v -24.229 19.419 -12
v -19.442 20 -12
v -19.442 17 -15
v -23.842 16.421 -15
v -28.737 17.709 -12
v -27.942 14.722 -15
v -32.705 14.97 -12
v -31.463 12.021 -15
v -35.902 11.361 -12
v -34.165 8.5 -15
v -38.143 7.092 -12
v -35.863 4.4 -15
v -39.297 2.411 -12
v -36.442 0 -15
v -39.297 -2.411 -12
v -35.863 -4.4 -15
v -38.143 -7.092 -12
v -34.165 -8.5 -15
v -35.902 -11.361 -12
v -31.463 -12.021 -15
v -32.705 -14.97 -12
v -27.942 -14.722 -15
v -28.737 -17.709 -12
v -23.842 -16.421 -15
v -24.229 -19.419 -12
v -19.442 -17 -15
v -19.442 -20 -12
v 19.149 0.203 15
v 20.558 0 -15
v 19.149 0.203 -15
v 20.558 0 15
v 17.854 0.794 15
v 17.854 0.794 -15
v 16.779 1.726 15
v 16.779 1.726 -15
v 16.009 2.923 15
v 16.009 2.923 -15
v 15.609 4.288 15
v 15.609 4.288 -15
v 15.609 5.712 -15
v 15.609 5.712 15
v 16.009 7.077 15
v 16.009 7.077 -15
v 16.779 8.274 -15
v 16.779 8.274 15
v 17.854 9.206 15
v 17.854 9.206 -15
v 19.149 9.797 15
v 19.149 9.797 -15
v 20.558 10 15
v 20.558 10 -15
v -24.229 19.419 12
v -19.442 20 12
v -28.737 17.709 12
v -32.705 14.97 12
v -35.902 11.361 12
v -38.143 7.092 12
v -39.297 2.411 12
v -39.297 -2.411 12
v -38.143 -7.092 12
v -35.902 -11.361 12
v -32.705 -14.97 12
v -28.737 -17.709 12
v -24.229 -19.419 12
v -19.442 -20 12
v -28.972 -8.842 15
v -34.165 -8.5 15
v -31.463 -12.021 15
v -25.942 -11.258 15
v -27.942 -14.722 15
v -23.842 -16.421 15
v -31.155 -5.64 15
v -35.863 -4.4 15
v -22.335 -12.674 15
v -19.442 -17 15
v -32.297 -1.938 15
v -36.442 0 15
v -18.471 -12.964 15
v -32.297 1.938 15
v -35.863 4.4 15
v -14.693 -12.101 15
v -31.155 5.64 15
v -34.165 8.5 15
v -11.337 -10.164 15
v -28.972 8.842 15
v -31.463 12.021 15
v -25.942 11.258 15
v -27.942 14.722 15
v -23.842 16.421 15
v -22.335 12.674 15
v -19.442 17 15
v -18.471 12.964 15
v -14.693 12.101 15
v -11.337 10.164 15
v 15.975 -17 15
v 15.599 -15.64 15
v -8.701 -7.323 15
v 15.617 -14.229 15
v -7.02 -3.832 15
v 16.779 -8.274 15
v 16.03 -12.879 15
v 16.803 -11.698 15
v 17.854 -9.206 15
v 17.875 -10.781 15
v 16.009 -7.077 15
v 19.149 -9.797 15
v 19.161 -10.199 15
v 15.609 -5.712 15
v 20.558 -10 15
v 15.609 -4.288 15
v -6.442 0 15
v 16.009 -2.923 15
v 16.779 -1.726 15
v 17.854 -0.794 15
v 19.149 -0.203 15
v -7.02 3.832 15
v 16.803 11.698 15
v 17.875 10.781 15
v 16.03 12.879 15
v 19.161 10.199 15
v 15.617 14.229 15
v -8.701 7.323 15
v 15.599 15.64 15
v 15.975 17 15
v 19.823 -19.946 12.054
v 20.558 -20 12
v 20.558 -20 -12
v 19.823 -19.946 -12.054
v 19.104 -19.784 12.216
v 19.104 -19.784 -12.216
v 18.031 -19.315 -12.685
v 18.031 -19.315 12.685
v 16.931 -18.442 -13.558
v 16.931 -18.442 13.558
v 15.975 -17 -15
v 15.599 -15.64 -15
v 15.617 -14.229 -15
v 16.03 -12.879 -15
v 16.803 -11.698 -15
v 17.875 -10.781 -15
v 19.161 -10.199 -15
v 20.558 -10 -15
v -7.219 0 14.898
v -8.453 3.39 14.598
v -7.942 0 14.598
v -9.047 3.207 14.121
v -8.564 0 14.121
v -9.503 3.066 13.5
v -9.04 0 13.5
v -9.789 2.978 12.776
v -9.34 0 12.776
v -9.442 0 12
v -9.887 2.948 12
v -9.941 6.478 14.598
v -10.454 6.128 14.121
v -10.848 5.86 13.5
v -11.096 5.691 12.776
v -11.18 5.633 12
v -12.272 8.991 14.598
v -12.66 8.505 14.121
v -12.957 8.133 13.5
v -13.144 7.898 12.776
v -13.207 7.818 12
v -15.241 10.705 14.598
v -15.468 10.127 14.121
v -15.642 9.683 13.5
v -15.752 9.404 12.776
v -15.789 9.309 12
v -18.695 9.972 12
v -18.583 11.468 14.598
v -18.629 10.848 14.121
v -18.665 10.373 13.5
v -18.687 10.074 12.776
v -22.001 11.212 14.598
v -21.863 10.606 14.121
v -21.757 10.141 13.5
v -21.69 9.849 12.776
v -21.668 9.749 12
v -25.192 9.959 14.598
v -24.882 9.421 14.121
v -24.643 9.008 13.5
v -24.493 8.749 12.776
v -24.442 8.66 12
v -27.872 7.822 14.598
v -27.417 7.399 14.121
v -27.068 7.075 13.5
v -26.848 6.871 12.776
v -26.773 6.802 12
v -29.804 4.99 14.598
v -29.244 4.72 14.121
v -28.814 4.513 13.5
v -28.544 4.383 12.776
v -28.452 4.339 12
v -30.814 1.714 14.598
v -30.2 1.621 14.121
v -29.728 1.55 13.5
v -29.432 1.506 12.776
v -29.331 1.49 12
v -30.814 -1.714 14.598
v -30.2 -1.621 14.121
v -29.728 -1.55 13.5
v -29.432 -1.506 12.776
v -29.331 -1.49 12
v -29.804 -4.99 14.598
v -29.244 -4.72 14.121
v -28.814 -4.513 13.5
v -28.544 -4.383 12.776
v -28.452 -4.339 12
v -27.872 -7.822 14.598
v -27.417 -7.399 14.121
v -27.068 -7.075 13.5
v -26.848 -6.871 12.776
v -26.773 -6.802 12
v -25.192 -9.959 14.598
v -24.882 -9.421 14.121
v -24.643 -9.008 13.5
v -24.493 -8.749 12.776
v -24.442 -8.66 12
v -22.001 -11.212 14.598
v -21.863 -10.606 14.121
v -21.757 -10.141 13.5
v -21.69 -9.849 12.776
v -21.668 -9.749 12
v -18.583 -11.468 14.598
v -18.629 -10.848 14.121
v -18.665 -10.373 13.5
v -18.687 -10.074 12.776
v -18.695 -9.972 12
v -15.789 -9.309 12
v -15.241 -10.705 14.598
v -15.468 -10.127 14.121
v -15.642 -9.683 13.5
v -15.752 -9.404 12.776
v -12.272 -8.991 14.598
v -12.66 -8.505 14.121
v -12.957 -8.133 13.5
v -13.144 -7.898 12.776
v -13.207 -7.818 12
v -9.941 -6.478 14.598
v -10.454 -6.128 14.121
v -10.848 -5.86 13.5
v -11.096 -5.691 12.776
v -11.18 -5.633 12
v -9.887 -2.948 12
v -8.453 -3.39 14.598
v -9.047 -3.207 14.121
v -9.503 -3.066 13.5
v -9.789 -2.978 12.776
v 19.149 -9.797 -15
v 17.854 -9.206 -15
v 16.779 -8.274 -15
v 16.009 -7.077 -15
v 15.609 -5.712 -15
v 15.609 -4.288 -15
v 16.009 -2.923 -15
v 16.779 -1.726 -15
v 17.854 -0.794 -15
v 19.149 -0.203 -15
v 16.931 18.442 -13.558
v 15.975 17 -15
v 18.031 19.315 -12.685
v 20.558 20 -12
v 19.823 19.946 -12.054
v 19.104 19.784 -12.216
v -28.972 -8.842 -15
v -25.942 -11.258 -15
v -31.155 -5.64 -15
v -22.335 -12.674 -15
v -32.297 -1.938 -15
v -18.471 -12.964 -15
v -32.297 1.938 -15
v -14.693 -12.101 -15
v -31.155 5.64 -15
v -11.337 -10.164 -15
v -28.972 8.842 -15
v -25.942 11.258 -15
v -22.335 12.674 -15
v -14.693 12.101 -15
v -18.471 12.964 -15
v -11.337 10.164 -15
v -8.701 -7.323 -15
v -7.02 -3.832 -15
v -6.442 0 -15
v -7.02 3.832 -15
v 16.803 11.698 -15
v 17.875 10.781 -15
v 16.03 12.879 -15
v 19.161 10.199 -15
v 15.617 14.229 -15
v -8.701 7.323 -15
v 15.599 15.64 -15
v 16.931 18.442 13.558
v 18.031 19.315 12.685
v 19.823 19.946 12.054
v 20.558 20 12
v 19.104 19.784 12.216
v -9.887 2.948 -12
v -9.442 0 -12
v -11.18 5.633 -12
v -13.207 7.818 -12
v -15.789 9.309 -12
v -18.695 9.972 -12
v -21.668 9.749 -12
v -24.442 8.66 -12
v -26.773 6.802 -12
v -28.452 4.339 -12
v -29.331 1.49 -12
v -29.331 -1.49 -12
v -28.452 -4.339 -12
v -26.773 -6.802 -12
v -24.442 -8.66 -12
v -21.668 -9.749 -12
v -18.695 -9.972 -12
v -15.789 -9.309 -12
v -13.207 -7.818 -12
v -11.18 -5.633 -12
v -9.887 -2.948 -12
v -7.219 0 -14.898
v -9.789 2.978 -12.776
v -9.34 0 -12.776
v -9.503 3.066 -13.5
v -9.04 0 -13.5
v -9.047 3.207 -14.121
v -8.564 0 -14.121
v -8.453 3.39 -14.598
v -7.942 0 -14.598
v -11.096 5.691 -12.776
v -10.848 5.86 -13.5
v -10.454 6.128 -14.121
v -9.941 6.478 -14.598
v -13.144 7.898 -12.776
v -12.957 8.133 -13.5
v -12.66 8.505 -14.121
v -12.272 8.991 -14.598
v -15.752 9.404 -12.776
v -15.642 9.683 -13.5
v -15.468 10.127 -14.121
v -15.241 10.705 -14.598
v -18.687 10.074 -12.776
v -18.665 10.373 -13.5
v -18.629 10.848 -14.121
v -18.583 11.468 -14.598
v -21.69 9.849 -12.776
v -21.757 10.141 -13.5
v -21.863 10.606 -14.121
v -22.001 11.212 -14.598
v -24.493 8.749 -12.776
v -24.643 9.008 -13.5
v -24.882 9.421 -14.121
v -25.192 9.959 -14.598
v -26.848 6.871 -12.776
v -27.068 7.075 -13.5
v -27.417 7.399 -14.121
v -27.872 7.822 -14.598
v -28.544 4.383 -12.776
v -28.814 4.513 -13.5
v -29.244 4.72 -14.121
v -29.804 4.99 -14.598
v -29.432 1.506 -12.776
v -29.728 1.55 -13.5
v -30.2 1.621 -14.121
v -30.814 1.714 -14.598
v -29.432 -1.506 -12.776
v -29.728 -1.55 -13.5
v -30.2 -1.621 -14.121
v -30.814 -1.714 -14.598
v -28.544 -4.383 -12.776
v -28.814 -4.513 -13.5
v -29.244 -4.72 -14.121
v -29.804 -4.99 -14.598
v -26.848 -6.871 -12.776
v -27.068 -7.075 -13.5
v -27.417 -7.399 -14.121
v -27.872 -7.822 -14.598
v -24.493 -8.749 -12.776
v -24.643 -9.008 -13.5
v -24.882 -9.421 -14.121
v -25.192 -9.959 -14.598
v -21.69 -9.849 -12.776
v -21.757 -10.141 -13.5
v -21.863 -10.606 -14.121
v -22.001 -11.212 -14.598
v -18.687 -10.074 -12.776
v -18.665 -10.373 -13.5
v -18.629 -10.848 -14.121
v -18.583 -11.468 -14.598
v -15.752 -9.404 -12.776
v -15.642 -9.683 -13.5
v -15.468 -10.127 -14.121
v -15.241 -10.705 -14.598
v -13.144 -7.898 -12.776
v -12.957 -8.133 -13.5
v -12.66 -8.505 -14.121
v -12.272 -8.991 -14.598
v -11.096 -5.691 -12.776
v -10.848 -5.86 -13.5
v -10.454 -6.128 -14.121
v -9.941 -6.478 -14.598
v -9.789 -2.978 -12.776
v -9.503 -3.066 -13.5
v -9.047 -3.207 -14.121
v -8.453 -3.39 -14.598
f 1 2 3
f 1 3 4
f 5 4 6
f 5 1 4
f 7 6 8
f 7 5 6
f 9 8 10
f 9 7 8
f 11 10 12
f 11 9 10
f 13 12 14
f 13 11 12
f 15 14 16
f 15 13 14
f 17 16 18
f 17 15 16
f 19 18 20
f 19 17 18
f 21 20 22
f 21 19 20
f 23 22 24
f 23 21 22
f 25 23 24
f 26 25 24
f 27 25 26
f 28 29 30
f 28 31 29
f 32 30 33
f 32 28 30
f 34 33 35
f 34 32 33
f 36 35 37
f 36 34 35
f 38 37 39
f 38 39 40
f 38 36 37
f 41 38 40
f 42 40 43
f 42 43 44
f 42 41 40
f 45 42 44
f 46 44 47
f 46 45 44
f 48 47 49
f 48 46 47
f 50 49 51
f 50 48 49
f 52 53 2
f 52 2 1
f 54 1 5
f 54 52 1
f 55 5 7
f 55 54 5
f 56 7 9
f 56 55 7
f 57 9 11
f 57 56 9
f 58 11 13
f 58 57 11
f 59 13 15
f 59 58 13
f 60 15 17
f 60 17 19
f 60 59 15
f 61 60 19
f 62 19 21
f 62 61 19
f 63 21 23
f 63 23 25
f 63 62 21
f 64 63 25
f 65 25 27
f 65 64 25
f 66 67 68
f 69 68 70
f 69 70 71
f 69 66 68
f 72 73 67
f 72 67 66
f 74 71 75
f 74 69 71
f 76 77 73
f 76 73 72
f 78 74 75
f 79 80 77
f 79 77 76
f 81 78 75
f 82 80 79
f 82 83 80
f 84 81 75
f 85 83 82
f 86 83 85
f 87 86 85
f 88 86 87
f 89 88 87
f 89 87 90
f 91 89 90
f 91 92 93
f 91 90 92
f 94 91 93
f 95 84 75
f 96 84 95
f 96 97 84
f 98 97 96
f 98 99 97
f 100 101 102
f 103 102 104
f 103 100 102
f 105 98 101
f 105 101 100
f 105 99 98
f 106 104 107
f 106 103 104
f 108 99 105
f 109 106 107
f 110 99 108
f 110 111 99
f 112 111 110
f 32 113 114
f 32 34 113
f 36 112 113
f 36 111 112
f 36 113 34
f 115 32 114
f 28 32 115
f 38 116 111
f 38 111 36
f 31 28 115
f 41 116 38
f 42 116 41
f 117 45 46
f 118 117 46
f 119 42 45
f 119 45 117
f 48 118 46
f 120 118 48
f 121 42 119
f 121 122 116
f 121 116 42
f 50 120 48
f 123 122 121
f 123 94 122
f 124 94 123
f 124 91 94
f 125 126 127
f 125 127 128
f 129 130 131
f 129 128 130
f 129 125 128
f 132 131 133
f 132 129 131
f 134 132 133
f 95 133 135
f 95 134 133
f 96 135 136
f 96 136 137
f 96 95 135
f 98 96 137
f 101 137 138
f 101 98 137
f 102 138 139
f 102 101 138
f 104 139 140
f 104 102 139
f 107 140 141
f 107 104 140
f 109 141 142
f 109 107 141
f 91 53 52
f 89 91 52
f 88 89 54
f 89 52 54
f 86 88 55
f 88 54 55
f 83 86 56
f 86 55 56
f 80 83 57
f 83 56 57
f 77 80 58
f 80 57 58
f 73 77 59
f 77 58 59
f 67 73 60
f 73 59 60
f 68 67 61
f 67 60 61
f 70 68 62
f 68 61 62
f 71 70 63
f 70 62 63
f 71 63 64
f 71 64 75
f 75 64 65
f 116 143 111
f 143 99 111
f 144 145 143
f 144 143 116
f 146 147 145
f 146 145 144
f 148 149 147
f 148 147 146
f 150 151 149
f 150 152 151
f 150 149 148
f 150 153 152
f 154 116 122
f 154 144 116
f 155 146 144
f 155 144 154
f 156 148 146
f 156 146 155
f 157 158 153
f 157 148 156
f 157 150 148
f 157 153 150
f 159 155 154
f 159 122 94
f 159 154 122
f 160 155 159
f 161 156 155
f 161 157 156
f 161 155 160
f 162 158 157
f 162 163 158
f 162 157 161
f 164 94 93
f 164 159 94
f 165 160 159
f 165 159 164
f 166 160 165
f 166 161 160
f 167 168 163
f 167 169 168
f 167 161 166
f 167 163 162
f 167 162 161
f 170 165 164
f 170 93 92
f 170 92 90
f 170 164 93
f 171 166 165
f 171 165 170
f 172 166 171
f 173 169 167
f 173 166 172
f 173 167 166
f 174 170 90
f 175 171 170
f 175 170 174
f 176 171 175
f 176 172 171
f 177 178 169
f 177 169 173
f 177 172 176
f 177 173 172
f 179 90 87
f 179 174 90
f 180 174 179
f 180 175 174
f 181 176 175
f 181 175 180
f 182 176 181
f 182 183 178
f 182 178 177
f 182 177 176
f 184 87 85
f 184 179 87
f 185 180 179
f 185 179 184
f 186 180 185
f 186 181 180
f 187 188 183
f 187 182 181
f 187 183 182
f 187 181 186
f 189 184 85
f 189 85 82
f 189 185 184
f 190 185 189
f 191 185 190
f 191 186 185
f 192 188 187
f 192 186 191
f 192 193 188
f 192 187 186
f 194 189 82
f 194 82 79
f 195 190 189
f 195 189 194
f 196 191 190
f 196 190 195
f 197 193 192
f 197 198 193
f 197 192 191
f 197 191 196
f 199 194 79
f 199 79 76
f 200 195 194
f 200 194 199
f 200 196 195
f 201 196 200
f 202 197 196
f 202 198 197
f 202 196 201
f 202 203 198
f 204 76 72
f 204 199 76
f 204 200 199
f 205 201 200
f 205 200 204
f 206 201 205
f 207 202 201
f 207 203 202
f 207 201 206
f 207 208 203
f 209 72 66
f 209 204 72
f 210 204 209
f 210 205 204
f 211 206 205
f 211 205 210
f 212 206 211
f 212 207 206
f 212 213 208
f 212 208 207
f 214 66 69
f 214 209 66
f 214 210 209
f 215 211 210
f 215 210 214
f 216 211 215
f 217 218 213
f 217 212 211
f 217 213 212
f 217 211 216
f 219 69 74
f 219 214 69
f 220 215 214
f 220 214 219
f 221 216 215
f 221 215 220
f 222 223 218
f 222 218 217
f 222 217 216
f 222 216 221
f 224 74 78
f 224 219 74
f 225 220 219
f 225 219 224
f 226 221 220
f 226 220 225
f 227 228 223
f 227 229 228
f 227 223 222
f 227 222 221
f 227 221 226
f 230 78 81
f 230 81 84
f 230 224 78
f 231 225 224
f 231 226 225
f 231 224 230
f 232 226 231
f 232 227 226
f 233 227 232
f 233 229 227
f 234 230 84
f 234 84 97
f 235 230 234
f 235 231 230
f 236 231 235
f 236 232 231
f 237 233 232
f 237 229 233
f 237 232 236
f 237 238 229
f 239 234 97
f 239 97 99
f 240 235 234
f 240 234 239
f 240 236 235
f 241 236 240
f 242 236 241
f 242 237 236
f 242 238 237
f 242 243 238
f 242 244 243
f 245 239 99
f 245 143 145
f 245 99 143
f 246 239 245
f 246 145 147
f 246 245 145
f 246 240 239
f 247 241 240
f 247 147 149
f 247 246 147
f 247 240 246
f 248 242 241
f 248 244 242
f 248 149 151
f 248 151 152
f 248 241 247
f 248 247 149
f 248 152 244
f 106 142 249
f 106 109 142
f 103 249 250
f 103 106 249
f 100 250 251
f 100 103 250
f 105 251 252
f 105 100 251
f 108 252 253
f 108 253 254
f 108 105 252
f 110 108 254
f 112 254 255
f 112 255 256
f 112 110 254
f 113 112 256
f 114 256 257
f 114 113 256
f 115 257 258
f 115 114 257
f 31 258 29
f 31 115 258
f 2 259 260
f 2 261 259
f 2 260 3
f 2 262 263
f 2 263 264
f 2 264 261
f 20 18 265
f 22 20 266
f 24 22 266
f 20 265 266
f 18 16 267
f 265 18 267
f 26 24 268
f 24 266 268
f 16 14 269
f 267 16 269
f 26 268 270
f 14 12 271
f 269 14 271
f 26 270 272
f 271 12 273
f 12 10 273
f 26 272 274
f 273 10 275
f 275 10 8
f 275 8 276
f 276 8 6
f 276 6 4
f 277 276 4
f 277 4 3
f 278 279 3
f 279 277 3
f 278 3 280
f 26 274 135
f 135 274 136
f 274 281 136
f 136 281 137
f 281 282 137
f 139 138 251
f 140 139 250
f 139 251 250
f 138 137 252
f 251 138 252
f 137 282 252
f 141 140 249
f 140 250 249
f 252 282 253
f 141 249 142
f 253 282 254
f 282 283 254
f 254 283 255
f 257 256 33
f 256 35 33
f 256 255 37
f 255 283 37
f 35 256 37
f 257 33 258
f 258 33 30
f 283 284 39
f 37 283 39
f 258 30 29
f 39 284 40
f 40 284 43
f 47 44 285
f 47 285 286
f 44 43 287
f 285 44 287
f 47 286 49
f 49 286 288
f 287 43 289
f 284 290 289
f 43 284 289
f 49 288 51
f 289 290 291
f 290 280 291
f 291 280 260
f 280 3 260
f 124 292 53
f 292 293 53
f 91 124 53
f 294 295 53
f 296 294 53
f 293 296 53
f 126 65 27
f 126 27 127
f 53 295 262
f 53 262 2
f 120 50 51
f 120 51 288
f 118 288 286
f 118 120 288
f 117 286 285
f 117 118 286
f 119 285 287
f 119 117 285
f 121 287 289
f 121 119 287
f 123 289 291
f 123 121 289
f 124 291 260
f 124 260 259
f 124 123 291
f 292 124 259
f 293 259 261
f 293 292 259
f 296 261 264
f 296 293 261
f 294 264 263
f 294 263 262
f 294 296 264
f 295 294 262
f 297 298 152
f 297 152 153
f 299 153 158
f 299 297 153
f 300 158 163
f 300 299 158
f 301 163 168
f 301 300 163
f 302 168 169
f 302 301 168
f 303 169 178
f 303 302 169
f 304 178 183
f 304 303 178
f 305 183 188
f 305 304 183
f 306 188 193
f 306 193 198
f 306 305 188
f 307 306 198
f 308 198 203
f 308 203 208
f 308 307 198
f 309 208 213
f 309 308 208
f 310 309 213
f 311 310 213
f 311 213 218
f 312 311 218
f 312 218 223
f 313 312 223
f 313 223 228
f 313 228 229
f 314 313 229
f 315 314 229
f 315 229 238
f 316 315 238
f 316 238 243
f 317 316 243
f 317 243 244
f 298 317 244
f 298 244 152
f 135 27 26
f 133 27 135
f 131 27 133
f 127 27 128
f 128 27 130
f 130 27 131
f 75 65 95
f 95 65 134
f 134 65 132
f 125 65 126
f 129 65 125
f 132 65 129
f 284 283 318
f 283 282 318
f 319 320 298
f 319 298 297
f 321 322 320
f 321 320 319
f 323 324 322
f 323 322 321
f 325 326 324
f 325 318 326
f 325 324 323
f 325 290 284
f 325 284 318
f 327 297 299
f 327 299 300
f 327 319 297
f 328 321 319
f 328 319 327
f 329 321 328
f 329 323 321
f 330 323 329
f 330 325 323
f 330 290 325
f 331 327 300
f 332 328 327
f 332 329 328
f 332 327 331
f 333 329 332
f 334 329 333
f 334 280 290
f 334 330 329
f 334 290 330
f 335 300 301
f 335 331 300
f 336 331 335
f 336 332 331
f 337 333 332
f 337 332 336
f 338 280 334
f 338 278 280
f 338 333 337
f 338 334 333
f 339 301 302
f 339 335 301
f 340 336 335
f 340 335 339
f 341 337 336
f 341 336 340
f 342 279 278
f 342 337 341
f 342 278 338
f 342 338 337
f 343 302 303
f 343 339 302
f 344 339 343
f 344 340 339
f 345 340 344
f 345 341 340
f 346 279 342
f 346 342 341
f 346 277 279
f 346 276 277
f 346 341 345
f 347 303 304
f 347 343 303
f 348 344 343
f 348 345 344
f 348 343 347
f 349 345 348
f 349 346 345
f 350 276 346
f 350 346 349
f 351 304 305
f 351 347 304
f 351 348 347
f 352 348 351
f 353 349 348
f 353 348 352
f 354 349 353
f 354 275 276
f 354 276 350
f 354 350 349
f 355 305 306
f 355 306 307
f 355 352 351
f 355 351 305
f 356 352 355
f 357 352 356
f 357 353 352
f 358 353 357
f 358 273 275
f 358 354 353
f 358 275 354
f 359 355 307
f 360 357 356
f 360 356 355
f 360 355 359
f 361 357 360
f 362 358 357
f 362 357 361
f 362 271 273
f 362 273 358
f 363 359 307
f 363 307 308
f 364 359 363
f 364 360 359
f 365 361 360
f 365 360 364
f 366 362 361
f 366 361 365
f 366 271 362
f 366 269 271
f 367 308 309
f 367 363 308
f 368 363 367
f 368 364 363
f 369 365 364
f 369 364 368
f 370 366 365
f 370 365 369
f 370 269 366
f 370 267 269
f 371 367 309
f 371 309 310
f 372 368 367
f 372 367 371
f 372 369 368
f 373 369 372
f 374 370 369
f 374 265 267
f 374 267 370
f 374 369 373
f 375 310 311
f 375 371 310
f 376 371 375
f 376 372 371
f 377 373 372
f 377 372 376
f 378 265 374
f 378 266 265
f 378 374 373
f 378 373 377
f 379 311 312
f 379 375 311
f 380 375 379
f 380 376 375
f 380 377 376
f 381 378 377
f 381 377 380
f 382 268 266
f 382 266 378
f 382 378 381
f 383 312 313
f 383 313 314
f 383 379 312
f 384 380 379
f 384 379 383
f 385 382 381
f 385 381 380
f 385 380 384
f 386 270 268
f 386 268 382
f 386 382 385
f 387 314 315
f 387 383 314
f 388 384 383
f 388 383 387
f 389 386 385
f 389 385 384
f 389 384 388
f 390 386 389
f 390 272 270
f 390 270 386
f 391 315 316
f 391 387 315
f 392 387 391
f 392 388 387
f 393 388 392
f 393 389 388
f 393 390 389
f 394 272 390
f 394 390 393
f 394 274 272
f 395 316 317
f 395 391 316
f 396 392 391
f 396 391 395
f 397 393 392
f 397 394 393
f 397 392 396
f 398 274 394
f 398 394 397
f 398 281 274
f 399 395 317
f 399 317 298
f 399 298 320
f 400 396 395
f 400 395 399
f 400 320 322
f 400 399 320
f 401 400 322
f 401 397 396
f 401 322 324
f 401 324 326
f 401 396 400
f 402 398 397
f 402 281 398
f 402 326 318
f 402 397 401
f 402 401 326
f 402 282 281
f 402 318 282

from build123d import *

# Parameters (mm, degrees)
F0_R     = 10
F1_DEPTH = 15
F2_R     = 3
F3_R     = 3
F4_SIZE  = 3
F5_SIZE  = 3


with BuildPart() as f1:
    # F0 (on Top) → F1 (new body, symmetric)
    with BuildSketch(Plane.XY):
        with BuildLine():
            Line((20.557612, 20), (-19.442388, 20))
            ThreePointArc((-19.442388, 20), (-39.442388, 0), (-19.442388, -20))
            Line((-19.442388, -20), (20.557612, -20))
            ThreePointArc((20.557612, -20), (15.557612, -15), (20.557612, -10))
            ThreePointArc((20.557612, -10), (15.557612, -5), (20.557612, 0))
            ThreePointArc((20.557612, 0), (15.557612, 5), (20.557612, 10))
            ThreePointArc((20.557612, 10), (15.557612, 15), (20.557612, 20))
        make_face()
        with Locations((-19.442388, 0)):
            Circle(F0_R, mode=Mode.SUBTRACT)
    extrude(amount=F1_DEPTH, both=True)

    # F2
    f2_edges = [f1.edges().sort_by_distance(p)[0] for p in [
        (-29.442388, 0, 15),
    ]]
    fillet(f2_edges, radius=F2_R)

    # F3
    f3_edges = [f1.edges().sort_by_distance(p)[0] for p in [
        (-29.442388, 0, -15),
    ]]
    fillet(f3_edges, radius=F3_R)

    # F4
    f4_edges = [f1.edges().sort_by_distance(p)[0] for p in [
        (0.557612, 20, 15),
        (-39.442388, 0, 15),
        (0.557612, -20, 15),
    ]]
    chamfer(f4_edges, length=F4_SIZE)

    # F5
    f5_edges = [f1.edges().sort_by_distance(p)[0] for p in [
        (0.557612, -20, -15),
        (-39.442388, 0, -15),
        (0.557612, 20, -15),
    ]]
    chamfer(f5_edges, length=F5_SIZE)


solid = f1.part
